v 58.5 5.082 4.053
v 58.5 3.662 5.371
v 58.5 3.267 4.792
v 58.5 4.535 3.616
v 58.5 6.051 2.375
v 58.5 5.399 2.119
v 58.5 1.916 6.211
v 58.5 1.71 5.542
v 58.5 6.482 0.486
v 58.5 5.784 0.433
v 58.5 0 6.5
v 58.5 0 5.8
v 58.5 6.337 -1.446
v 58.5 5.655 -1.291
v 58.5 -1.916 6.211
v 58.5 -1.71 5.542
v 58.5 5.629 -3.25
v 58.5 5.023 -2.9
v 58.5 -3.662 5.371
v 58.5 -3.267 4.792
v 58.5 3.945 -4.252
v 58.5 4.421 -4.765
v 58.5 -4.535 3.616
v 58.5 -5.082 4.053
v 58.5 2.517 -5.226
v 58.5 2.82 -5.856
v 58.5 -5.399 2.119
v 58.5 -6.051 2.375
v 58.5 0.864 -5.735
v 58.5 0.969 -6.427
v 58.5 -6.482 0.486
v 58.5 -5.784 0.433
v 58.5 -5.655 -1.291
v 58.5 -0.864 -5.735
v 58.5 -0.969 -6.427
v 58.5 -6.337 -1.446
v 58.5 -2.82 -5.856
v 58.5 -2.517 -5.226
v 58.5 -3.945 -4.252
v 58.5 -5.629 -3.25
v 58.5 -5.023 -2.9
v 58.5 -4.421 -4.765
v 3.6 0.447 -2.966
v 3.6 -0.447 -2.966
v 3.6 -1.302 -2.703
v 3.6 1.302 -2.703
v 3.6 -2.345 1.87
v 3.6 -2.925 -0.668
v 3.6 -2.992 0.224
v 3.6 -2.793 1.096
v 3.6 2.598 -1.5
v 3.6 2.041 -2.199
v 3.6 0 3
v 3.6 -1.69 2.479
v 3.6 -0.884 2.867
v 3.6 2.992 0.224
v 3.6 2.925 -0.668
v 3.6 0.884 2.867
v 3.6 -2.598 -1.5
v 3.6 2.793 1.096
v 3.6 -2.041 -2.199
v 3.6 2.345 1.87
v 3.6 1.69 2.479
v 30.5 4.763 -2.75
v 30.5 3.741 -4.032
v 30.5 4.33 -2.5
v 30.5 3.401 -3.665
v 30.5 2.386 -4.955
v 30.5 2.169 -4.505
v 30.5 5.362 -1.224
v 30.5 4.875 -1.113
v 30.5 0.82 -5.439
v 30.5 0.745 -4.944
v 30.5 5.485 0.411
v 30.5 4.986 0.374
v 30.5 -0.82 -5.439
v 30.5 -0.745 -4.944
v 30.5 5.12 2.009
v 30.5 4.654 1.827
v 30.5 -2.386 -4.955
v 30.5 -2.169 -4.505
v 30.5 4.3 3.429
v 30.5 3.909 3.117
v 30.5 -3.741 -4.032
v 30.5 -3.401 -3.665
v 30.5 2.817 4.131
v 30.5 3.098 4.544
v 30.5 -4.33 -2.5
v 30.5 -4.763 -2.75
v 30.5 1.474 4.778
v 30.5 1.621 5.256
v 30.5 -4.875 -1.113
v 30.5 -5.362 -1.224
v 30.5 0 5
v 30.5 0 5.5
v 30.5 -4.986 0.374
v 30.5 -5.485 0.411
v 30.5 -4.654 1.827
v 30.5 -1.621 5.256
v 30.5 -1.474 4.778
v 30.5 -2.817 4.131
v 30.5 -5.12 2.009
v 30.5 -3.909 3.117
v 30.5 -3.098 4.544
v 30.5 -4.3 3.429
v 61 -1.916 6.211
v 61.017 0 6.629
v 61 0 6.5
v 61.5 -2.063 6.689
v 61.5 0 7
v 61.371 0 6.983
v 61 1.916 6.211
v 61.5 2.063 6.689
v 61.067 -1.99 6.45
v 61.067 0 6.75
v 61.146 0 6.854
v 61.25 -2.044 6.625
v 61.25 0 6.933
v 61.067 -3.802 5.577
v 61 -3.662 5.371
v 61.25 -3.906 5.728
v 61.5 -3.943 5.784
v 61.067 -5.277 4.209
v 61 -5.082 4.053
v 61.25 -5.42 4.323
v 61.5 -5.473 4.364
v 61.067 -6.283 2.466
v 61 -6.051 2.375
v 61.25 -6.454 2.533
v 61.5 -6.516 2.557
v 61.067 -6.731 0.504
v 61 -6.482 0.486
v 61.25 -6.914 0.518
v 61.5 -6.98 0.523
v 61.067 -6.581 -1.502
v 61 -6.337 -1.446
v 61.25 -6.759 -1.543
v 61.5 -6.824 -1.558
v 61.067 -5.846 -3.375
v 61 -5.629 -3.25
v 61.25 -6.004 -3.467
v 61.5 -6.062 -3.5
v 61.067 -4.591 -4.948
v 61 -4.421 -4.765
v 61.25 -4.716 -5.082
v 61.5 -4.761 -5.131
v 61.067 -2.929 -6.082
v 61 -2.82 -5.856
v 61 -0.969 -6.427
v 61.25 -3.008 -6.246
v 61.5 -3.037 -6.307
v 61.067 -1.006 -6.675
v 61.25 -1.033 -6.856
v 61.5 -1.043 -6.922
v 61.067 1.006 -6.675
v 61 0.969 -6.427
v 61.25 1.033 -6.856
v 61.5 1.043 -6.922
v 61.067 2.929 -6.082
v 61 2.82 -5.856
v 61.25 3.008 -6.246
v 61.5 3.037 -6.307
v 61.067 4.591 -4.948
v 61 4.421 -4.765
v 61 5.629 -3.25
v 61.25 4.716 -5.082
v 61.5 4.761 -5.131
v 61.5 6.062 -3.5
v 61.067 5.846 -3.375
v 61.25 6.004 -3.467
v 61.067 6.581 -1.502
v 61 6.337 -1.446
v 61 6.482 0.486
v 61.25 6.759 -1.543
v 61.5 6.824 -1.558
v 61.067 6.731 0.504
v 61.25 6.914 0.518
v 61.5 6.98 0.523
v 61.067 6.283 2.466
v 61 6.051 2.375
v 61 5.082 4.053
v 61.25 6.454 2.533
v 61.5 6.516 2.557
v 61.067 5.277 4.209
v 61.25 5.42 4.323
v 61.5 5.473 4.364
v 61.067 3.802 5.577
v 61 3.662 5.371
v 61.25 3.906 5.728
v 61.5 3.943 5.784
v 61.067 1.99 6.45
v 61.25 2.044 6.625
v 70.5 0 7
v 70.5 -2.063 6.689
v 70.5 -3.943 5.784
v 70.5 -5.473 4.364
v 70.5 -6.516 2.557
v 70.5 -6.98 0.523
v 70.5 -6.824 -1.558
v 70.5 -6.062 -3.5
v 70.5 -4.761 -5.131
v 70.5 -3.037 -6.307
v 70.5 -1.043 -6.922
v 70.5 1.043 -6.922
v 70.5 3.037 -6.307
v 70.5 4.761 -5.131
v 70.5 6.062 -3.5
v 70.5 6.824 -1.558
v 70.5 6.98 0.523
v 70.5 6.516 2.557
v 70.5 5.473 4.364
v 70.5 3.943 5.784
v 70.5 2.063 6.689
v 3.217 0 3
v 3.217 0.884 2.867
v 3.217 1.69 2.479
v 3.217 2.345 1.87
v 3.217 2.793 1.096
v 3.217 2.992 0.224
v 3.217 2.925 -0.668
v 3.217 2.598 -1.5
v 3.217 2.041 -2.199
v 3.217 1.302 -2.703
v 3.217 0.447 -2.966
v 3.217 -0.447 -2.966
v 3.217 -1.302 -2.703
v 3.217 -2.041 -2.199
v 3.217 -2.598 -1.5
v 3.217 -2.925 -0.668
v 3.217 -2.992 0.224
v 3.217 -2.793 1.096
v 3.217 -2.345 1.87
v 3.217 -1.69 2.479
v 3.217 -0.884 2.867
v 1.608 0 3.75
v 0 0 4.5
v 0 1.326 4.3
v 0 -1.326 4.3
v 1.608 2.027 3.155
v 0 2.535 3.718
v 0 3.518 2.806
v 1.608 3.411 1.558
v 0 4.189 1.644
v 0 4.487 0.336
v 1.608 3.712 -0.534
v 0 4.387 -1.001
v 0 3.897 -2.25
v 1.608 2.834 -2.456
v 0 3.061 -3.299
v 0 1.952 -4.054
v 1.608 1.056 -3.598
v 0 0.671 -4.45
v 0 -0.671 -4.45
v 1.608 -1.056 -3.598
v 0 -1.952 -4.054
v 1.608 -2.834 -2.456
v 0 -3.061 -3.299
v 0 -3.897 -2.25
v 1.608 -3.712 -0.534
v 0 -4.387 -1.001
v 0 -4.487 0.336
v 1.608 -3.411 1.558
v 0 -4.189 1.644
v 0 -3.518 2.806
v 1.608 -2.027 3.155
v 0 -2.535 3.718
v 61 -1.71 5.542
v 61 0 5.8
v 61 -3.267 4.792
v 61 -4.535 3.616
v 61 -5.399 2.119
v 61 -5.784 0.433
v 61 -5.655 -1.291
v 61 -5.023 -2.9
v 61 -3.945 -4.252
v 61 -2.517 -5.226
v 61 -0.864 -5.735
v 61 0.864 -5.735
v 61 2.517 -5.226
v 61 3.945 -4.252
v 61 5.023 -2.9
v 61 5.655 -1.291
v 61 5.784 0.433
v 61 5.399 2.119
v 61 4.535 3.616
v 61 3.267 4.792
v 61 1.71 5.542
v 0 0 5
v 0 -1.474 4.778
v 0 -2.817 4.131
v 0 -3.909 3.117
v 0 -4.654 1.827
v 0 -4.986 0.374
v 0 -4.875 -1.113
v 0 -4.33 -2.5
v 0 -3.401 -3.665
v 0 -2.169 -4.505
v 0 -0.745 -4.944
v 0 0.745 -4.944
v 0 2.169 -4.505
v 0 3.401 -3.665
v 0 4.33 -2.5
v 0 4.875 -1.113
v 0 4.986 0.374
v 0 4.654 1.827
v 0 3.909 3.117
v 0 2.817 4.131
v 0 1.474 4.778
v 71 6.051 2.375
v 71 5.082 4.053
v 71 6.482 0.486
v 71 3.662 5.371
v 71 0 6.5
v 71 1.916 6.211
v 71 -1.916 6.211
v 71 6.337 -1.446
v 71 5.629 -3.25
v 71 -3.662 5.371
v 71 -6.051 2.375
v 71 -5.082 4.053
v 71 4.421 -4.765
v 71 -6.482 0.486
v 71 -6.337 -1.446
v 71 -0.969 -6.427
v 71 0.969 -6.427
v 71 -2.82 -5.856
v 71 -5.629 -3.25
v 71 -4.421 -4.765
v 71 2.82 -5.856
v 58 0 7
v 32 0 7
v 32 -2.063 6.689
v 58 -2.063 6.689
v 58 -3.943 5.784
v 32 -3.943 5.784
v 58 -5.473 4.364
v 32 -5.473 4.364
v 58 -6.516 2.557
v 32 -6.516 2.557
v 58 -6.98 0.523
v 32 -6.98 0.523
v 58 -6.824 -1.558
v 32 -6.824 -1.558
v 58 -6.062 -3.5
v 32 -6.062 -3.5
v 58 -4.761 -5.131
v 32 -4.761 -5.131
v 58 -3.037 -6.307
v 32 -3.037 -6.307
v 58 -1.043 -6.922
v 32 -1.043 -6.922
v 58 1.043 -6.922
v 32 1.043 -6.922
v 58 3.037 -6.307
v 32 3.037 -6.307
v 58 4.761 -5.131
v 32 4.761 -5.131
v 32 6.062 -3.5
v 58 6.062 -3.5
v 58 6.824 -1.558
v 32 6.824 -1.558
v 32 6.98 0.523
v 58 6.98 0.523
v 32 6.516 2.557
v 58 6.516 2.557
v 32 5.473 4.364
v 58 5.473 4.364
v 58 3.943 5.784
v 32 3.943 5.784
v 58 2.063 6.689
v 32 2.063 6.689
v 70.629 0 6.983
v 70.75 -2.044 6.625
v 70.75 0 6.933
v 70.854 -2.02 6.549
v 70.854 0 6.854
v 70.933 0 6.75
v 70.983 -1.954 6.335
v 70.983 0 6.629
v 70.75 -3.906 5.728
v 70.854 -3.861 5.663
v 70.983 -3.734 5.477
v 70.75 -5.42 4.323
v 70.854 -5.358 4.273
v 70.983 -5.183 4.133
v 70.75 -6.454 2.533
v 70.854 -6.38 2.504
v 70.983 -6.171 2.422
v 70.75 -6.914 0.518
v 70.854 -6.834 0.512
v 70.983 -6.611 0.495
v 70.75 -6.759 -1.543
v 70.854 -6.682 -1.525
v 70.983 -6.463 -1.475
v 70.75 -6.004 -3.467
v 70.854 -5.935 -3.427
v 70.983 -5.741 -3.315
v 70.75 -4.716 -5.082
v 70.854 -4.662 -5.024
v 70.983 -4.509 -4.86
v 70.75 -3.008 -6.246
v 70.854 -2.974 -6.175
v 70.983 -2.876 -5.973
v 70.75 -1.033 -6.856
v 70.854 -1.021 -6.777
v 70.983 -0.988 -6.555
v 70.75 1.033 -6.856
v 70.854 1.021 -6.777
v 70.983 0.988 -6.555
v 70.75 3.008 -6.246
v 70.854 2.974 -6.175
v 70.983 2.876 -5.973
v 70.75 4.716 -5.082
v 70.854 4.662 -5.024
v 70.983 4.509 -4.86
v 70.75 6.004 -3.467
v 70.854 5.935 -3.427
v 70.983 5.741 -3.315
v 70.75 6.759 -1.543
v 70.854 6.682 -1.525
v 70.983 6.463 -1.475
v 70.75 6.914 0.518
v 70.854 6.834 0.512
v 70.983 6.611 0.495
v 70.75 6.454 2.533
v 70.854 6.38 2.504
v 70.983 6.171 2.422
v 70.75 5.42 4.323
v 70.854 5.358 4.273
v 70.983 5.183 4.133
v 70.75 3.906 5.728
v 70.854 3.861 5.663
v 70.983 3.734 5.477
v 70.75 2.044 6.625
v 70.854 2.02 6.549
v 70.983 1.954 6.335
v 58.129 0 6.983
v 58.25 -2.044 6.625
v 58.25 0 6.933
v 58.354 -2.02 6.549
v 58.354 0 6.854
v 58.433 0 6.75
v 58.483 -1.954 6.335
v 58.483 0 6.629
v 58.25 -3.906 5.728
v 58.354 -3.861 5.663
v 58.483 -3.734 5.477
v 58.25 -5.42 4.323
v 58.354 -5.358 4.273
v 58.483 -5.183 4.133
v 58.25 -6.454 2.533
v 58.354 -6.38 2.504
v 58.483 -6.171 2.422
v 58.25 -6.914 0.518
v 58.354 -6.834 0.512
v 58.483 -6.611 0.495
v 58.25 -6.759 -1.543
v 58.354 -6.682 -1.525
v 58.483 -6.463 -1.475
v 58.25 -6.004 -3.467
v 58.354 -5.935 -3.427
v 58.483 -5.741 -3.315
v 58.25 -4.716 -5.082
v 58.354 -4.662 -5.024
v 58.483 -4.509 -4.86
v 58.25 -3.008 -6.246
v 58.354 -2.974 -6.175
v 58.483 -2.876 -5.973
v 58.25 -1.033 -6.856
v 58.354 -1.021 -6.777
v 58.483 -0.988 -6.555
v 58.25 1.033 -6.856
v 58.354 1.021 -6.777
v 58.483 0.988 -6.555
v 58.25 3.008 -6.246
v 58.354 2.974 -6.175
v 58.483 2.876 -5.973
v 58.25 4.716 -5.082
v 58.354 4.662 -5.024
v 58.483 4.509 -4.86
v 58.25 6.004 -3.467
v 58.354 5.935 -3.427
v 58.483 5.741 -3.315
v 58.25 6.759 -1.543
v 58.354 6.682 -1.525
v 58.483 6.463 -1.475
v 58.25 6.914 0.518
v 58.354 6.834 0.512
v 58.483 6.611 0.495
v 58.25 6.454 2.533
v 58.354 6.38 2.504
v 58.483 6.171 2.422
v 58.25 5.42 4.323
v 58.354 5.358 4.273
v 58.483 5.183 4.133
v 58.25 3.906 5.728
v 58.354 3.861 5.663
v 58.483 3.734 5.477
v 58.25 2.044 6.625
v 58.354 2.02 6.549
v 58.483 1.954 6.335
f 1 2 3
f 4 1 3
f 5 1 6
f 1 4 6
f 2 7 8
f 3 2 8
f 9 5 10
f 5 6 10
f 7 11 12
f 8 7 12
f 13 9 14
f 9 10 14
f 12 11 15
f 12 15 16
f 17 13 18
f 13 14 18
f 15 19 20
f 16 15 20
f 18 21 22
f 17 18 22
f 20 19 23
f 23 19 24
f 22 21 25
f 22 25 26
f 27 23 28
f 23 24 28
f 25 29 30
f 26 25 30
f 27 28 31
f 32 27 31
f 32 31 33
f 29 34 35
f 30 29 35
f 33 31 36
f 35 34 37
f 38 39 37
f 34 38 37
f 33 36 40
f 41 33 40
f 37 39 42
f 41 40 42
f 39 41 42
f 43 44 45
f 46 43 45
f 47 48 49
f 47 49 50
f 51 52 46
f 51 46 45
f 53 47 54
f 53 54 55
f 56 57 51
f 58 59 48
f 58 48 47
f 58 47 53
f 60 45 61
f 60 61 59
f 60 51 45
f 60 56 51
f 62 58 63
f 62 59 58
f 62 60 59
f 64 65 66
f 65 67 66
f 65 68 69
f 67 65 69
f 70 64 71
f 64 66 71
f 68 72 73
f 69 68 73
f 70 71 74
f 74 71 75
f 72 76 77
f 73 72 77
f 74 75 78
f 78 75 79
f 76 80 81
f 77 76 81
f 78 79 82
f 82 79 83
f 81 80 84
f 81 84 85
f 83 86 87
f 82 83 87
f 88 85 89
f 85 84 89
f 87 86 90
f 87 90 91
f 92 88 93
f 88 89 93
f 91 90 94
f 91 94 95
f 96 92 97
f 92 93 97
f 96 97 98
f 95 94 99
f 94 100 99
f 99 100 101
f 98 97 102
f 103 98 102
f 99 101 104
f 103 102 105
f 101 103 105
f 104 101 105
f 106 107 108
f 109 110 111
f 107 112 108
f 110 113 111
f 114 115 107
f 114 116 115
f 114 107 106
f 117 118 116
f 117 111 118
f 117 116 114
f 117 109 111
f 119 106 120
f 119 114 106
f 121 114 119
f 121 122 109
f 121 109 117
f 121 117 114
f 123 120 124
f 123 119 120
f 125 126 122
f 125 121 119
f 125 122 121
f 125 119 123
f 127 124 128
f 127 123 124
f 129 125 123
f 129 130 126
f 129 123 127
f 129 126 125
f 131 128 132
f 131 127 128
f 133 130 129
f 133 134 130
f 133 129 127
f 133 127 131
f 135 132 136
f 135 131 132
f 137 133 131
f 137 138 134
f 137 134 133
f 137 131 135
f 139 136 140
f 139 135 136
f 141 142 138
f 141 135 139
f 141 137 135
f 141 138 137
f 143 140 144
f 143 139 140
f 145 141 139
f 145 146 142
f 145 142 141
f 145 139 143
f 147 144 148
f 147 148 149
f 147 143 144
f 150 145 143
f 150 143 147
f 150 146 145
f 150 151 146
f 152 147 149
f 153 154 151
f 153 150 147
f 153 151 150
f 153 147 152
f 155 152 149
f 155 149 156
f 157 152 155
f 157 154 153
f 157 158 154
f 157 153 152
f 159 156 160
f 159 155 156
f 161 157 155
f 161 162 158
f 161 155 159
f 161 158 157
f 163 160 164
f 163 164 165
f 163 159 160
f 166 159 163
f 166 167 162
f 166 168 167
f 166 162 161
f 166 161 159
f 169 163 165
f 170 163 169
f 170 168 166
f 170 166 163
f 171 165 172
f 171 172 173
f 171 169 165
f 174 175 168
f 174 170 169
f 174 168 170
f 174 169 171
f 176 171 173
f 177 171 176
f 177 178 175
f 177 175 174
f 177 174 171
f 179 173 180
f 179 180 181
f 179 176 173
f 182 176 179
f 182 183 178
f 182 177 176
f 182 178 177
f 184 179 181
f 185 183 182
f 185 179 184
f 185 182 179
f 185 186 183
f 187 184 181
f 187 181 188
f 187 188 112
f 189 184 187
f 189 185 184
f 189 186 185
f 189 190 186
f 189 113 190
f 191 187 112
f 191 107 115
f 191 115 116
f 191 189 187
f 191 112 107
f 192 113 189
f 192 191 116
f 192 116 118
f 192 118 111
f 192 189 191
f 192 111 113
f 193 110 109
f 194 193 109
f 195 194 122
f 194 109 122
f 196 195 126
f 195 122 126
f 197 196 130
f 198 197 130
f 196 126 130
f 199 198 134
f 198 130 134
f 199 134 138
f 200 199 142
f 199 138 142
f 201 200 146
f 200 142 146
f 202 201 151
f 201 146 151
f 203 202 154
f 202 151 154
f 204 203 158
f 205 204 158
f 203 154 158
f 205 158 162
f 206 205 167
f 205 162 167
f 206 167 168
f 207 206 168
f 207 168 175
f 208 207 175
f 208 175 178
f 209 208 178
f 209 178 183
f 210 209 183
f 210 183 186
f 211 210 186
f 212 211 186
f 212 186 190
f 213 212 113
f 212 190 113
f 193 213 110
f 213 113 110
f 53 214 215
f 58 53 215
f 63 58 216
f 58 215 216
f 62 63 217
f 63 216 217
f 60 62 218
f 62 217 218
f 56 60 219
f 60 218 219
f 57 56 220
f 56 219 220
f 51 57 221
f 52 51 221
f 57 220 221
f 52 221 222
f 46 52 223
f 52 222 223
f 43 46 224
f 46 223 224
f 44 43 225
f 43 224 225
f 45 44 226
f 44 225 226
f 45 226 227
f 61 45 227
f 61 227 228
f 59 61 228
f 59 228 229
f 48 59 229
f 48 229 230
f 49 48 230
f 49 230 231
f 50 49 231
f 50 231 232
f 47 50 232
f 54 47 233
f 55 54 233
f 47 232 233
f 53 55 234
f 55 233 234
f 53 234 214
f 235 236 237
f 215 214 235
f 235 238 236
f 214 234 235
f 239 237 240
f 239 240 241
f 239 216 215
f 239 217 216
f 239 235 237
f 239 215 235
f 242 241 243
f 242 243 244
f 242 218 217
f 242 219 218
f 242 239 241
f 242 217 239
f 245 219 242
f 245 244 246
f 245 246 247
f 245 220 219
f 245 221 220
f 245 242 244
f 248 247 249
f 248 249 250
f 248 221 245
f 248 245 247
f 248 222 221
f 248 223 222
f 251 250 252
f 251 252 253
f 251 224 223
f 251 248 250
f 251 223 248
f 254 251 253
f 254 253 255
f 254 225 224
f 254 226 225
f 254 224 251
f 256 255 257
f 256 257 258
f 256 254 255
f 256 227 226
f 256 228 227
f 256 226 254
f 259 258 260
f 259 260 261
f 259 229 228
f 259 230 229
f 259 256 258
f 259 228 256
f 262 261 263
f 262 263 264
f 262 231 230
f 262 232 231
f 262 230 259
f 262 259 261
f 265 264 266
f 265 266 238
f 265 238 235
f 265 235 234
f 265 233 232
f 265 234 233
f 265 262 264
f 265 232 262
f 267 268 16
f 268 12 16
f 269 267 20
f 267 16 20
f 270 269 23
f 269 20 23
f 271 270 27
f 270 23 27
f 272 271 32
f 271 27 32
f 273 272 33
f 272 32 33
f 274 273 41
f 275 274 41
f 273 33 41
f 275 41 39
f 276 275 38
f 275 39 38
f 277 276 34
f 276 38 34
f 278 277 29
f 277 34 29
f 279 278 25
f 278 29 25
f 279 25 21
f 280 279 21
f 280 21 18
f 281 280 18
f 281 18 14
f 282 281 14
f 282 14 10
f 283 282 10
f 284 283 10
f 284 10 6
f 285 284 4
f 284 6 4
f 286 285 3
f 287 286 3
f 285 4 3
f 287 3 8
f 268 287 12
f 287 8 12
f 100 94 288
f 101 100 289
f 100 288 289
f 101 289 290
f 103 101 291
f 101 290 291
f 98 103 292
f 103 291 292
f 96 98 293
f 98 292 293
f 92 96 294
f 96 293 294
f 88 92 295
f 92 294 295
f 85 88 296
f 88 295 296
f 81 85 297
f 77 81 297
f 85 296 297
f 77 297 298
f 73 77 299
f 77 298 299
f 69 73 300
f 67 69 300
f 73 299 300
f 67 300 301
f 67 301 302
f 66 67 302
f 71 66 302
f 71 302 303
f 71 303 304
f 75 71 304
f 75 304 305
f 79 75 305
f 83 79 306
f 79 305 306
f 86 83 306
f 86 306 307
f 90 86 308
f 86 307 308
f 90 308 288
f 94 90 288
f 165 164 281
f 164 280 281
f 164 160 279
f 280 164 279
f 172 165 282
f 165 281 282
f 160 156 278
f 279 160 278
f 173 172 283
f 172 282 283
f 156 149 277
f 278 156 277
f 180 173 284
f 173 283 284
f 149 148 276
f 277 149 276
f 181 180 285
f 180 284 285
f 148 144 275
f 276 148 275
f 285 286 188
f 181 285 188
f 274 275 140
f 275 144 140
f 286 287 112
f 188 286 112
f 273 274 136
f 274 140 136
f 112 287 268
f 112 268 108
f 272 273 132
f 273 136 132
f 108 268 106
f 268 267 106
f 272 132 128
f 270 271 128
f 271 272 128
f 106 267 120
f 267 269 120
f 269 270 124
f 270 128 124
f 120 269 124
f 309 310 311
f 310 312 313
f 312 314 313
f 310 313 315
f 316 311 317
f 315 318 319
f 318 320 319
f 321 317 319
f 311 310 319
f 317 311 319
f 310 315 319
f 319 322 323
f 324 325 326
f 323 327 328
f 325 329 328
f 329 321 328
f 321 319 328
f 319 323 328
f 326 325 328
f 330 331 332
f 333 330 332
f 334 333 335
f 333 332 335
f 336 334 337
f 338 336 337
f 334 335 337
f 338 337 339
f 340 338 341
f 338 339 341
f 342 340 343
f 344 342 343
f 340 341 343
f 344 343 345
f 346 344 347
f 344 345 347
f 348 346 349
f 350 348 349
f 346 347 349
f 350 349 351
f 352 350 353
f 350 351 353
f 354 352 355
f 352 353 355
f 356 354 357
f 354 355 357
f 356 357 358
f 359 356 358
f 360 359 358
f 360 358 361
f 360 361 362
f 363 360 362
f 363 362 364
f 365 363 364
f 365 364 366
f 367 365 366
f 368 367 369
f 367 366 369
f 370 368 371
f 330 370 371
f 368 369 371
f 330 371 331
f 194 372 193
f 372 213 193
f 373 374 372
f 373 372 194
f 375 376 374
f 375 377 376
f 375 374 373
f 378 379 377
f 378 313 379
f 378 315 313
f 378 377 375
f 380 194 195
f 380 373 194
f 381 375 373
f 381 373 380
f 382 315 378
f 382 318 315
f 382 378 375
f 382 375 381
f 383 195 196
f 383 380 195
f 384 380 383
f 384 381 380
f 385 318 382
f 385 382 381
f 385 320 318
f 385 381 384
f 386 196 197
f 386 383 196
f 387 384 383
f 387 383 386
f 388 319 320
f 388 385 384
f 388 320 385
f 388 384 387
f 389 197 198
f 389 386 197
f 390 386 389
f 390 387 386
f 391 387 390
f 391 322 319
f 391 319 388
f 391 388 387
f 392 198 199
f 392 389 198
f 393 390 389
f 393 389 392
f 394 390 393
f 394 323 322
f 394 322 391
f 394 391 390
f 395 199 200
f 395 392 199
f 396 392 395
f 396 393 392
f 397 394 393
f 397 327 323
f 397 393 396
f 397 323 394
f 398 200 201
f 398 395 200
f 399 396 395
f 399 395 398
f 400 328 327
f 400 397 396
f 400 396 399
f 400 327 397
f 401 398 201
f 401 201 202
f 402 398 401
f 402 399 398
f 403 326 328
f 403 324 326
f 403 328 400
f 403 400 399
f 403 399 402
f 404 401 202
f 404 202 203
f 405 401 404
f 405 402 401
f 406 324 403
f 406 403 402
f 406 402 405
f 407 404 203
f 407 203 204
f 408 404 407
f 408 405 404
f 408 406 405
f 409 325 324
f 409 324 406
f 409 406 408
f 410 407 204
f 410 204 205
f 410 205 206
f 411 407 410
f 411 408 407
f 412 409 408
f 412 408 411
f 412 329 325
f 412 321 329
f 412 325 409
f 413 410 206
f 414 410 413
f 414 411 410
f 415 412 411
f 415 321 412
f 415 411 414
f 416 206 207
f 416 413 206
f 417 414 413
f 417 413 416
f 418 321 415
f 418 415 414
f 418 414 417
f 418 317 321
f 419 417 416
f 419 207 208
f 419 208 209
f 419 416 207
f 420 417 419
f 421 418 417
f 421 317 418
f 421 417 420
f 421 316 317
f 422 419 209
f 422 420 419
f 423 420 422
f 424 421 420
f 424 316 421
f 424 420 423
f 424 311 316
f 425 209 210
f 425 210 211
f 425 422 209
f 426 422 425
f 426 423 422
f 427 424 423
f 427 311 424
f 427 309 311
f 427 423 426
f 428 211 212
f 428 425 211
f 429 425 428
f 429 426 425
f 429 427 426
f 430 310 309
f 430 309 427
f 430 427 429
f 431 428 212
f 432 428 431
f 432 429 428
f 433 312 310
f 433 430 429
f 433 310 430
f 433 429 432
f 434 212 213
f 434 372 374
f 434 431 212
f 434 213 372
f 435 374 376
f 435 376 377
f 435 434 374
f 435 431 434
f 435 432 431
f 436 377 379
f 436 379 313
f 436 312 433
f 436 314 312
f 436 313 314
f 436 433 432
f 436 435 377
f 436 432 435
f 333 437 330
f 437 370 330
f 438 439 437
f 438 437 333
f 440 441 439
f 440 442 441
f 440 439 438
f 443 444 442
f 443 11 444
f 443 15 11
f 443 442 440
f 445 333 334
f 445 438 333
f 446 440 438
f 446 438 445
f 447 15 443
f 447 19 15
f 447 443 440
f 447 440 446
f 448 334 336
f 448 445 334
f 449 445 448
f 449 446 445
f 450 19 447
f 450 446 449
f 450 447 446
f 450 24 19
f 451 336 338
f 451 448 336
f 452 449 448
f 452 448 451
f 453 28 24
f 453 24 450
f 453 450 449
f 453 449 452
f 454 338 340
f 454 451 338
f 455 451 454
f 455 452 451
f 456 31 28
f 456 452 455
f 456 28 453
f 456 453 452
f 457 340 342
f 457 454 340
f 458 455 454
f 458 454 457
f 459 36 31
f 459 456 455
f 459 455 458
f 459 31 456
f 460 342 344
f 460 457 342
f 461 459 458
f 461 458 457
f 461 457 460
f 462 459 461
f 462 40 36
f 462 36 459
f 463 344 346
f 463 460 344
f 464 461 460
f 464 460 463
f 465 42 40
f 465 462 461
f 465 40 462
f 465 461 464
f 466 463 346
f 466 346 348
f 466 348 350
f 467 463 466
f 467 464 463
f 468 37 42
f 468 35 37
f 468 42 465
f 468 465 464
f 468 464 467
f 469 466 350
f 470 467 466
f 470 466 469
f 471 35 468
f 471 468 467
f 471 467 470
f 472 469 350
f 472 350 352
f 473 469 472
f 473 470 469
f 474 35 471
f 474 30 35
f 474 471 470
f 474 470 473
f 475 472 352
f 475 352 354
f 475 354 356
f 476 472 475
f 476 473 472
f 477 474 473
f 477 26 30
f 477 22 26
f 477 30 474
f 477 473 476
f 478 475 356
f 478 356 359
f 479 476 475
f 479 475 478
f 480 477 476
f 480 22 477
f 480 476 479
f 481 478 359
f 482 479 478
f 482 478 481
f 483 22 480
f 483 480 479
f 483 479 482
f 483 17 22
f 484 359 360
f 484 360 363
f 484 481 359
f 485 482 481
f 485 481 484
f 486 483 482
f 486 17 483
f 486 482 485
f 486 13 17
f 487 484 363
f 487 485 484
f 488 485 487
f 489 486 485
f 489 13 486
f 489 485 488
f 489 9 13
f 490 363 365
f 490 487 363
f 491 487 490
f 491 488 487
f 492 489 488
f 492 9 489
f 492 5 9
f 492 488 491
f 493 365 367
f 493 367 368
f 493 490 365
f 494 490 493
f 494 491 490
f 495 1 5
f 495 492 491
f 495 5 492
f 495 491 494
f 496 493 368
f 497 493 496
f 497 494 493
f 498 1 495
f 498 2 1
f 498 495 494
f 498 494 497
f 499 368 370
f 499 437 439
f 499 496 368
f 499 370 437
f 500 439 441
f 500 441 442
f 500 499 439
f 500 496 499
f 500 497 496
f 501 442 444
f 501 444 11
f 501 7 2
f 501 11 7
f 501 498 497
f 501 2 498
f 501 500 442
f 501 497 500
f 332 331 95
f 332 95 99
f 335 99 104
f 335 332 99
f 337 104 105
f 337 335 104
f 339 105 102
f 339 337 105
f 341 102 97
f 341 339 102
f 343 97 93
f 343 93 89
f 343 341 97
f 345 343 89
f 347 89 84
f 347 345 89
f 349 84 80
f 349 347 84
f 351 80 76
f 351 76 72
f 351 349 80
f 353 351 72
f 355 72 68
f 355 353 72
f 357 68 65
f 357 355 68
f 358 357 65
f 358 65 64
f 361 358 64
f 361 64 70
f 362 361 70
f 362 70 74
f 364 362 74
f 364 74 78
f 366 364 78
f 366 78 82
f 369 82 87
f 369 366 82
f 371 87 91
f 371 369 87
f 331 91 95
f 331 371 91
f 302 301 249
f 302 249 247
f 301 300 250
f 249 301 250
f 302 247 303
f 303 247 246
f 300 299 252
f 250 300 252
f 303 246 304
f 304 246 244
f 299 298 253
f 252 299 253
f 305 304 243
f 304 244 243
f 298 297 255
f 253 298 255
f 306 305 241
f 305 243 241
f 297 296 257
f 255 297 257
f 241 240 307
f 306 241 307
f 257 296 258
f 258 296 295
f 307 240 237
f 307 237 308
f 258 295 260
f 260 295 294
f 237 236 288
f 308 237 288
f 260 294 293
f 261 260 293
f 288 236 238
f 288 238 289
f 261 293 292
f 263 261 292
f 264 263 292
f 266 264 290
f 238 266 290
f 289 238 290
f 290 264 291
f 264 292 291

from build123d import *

# Parameters (mm, degrees)
ESBO_O2_R             = 3
CORTE_EXTRUS_O1_DEPTH = 3.6
CHANFRO2_SIZE         = 1.5
CHANFRO2_SIZE2        = 3.216760381
CHANFRO3_SIZE         = 1.5
FILETE3_R             = 0.5


with BuildPart() as part:
    # Esboço1 → Revolução1 (revolve)
    with BuildSketch(Plane.XY, mode=Mode.PRIVATE) as revolu_o1_sk:
        Polygon((0, 0), (71, 0), (71, 7), (61, 7), (61, 5.8), (58.5, 5.8), (58.5, 7), (30.5, 7), (30.5, 5), (0, 5), align=None)
    revolve(revolu_o1_sk.sketch.rotate(Axis((0, 0, 0), (1, 0, 0)), 90), axis=Axis((0, 0, 0), (1, 0, 0)))

    # Esboço2 → Corte-extrusão1 (cut)
    with BuildSketch(Plane.ZY):
        Circle(ESBO_O2_R)
    extrude(amount=-CORTE_EXTRUS_O1_DEPTH, mode=Mode.SUBTRACT)

    # Chanfro2
    chanfro2_edges = [part.edges().sort_by_distance(p)[0] for p in [
        (0, 0, -3),
    ]]
    chanfro2_side = [part.faces().sort_by_distance(p)[0] for p in [
        (0, 0, -4.858578644),
    ]]
    chamfer(chanfro2_edges, length=CHANFRO2_SIZE, length2=CHANFRO2_SIZE2, reference=chanfro2_side[0])

    # Chanfro3
    chanfro3_edges = [part.edges().sort_by_distance(p)[0] for p in [
        (30.5, 0, -7),
    ]]
    chamfer(chanfro3_edges, length=CHANFRO3_SIZE)

    # Filete3
    filete3_edges = [part.edges().sort_by_distance(p)[0] for p in [
        (71, 0, -7),
        (58.5, 0, -7),
        (61, 0, -7),
    ]]
    fillet(filete3_edges, radius=FILETE3_R)


solid = part.part
